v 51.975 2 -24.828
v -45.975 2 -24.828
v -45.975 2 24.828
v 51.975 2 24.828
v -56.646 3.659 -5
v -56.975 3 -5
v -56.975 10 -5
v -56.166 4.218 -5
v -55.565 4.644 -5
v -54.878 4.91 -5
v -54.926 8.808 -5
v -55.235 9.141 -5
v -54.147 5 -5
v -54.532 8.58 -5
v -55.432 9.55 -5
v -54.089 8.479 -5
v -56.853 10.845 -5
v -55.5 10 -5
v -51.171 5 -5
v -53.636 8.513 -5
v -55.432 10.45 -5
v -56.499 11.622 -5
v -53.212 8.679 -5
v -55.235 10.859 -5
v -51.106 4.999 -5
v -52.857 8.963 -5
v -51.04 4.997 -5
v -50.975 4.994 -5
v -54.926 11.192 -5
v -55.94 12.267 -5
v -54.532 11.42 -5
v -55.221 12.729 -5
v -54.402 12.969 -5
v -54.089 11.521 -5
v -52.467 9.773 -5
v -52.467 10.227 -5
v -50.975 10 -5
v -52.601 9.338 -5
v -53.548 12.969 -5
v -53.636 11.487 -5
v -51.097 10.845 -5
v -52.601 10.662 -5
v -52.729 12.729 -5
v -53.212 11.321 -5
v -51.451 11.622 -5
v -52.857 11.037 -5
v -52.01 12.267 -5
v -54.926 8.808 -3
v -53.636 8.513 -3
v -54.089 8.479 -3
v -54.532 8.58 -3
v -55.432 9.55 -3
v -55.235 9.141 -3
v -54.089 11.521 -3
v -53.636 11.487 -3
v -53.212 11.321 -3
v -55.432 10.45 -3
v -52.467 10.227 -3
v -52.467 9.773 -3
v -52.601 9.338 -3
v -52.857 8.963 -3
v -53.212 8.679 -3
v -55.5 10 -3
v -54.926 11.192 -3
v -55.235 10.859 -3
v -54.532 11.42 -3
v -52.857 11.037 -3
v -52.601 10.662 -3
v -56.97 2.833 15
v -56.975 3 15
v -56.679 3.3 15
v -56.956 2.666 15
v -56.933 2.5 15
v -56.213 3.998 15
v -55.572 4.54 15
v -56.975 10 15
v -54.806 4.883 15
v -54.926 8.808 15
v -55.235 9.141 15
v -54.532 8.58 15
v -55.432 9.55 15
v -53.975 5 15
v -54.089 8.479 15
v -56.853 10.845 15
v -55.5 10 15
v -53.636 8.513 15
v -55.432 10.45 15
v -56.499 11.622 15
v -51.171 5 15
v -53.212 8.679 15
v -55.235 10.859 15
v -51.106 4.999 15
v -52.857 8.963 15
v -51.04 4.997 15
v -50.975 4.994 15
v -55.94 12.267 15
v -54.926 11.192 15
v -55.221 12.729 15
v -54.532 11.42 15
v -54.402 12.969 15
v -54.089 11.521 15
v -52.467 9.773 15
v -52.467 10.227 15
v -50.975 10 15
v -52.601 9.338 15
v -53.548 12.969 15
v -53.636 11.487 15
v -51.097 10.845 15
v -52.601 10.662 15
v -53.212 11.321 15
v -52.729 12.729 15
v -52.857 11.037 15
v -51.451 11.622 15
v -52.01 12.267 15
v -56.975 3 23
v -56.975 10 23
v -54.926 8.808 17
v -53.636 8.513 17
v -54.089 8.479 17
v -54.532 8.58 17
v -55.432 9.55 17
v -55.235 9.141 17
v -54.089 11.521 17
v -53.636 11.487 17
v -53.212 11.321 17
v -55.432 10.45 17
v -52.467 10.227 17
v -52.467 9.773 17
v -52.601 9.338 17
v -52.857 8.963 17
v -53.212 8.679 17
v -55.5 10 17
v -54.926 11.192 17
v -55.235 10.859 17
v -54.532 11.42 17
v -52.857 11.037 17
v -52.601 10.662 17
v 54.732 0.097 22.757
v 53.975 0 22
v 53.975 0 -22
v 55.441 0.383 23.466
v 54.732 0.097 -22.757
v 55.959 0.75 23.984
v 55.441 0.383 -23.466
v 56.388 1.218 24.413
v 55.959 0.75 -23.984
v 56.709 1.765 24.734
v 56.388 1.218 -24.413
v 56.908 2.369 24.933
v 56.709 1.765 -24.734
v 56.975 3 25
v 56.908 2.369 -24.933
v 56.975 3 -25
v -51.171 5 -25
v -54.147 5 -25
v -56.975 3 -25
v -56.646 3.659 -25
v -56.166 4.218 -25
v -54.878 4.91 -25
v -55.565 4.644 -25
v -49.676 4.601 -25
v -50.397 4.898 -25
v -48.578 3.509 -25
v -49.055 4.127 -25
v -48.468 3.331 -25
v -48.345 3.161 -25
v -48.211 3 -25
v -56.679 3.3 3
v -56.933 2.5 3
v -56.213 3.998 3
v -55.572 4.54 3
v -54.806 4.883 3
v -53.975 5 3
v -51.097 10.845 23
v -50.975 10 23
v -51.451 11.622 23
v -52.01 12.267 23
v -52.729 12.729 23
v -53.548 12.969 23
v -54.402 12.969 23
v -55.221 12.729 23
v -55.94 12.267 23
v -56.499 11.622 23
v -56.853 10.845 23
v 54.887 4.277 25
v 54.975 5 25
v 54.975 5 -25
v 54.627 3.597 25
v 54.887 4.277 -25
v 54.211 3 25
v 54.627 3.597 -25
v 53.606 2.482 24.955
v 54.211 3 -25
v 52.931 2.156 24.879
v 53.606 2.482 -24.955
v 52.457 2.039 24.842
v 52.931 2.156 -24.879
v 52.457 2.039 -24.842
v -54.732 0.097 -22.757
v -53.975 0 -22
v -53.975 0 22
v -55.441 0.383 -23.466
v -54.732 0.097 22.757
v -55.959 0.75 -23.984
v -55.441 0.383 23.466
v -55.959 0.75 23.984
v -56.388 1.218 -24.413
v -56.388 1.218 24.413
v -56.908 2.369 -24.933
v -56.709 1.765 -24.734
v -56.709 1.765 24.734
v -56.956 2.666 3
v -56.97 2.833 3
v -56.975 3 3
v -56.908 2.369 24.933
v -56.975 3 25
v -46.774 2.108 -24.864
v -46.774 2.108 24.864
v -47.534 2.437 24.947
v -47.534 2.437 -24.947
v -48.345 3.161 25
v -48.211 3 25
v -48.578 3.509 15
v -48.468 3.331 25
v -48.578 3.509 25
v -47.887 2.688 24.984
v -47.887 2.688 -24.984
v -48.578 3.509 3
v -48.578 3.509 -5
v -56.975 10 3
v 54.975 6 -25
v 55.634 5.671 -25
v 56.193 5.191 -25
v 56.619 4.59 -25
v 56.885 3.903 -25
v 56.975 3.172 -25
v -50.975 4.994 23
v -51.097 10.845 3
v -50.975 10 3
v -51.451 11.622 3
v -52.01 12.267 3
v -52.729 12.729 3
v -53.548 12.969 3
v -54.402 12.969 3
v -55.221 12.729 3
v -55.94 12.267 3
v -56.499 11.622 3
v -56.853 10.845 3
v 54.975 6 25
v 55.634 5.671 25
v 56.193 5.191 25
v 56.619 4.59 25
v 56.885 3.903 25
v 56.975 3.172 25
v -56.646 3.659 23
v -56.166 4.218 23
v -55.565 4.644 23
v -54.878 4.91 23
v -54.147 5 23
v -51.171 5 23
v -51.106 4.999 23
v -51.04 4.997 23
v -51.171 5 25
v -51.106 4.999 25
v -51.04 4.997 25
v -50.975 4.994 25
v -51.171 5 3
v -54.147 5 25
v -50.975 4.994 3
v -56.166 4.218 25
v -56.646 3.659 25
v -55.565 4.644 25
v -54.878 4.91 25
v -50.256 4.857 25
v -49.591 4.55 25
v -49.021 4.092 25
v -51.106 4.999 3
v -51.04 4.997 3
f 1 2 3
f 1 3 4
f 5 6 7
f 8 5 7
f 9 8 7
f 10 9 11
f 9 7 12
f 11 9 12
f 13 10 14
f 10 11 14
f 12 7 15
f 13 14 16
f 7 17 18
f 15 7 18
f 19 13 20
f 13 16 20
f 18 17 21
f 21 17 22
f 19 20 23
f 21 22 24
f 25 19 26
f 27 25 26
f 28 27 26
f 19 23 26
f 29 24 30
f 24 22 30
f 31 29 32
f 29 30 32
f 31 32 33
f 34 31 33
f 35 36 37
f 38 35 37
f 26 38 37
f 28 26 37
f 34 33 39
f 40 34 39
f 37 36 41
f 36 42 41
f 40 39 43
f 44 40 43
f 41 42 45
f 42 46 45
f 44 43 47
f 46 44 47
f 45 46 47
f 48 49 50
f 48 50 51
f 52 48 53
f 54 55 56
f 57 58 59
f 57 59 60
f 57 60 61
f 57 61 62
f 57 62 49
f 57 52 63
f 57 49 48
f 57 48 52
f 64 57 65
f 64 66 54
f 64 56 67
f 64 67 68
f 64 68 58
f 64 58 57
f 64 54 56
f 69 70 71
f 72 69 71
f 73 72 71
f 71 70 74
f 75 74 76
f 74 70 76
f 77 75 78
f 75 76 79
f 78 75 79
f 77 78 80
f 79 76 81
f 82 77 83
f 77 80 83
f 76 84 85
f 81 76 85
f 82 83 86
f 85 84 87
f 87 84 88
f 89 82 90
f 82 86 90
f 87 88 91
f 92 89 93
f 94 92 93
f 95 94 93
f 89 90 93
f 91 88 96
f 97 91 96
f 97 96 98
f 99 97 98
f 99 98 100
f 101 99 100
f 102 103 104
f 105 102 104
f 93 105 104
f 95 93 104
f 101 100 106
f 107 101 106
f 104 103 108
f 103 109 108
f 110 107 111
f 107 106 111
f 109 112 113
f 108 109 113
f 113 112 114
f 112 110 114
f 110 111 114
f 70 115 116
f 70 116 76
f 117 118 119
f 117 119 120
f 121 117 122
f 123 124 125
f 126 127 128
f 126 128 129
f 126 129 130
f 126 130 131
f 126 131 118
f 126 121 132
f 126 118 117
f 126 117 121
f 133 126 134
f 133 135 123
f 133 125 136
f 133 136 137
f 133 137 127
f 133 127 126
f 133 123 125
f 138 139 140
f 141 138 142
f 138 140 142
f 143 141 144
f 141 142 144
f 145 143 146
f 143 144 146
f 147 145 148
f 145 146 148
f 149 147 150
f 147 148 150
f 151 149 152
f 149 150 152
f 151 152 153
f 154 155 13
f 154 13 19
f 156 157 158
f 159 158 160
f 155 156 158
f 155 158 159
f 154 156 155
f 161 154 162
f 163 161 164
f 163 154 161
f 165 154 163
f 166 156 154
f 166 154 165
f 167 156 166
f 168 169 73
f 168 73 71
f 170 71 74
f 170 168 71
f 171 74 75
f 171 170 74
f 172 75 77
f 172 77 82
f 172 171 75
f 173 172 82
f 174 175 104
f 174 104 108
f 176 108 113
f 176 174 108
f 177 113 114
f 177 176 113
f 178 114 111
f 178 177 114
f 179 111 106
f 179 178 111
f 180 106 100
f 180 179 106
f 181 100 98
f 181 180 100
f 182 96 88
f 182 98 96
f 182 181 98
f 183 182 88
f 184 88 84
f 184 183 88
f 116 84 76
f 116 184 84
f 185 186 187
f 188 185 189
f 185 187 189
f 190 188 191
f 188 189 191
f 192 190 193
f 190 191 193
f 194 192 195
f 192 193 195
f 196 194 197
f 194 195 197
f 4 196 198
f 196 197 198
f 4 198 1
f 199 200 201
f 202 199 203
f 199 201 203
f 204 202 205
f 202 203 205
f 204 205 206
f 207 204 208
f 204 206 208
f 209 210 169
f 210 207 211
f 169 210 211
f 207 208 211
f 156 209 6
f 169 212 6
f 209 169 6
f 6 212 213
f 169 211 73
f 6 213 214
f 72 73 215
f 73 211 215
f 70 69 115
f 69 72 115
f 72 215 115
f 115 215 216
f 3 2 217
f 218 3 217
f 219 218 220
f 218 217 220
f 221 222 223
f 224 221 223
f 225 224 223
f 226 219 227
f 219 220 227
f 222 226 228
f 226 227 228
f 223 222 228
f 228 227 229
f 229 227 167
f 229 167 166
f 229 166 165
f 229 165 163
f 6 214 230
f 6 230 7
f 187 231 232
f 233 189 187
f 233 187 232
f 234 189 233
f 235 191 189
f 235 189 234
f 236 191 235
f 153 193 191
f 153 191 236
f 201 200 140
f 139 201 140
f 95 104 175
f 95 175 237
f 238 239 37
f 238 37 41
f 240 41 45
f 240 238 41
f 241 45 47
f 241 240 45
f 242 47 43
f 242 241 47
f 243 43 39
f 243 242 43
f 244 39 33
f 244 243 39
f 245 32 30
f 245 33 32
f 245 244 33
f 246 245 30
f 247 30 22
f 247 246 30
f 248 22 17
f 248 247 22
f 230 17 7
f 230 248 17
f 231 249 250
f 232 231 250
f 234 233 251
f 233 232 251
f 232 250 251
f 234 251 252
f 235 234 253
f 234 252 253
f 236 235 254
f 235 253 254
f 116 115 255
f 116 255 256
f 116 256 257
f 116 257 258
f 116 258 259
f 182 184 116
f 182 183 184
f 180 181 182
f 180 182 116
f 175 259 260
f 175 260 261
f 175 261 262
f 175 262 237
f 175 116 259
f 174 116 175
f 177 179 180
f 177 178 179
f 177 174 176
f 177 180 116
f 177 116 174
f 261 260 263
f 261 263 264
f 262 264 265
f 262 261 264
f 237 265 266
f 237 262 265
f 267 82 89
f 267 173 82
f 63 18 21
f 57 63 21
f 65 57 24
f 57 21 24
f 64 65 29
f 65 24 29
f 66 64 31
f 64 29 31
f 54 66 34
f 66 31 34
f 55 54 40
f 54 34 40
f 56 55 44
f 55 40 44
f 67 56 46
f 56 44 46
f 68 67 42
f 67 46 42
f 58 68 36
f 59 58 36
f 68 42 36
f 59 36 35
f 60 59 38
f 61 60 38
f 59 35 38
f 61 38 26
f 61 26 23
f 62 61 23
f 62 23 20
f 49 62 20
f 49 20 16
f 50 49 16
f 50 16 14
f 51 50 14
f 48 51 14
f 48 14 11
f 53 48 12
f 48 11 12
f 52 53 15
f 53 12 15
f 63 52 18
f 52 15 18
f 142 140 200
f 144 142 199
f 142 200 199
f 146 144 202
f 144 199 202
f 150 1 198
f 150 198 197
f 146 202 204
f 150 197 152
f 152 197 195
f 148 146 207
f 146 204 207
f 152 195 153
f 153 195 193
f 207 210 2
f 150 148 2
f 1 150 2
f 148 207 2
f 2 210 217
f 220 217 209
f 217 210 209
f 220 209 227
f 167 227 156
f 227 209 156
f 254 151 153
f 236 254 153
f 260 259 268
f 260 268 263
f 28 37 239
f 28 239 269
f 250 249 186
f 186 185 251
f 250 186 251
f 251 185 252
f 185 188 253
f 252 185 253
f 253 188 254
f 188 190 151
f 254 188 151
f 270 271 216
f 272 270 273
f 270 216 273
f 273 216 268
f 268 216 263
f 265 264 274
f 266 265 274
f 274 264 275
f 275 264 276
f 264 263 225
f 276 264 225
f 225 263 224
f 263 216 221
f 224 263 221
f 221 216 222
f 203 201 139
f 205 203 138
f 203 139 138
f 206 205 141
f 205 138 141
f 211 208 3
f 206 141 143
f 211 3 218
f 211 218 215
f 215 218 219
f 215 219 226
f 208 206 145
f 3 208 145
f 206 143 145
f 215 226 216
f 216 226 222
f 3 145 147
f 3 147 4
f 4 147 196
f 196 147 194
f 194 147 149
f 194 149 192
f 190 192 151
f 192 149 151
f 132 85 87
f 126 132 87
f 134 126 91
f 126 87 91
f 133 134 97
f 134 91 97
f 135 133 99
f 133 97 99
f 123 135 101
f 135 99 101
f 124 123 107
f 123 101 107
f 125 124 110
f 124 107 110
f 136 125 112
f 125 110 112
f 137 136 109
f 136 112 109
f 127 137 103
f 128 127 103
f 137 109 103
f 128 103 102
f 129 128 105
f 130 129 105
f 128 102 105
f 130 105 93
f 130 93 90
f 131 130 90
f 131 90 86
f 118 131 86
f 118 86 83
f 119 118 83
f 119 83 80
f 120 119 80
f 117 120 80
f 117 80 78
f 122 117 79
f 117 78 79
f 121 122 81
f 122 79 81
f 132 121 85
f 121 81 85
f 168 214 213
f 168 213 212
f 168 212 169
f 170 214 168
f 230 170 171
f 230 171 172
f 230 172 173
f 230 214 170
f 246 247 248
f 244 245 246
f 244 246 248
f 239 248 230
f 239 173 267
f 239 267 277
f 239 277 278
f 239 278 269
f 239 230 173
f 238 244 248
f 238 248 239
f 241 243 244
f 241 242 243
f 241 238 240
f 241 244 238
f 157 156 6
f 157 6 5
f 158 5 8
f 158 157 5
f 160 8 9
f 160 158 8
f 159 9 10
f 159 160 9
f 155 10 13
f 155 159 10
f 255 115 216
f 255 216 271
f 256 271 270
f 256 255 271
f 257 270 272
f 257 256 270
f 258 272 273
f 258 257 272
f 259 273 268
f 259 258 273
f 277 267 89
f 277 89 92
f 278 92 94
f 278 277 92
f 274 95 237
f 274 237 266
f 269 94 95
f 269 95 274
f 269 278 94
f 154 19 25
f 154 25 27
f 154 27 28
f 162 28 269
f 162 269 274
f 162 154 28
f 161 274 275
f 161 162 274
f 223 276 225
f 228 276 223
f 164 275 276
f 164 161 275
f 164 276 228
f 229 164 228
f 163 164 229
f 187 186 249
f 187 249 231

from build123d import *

# Parameters (mm, degrees)
SKETCH1_W                     = 113.95
SKETCH1_H                     = 50
BOSS_EXTRUDE1_DEPTH           = 2
SKETCH2_W                     = 8
SKETCH2_H                     = 50
BOSS_EXTRUDE2_DEPTH           = 3
SKETCH3_W                     = 2
SKETCH3_H                     = 50
BOSS_EXTRUDE3_DEPTH           = 4
SKETCH7_W                     = 6
SKETCH7_H                     = 8
BOSS_EXTRUDE5_DEPTH           = 8
FILLET1_RADIUS                = 3
FILLET1_LENGTH                = 8
SKETCH10_R                    = 1.525
CUT_EXTRUDE2_DEPTH            = 2
LPATTERN2_COUNT               = 2
LPATTERN2_PITCH               = 20
FILLET1_OF_LPATTERN2_2_RADIUS = 3
FILLET1_OF_LPATTERN2_2_LENGTH = 8
FILLET2_R                     = 3
FILLET3_R                     = 3
FILLET4_START                 = -25
FILLET4_DEPTH                 = 20
FILLET4_START_2               = 3
FILLET4_2_DEPTH               = 12
FILLET4_START_3               = -19.719
FILLET4_3_DEPTH               = 44.719
FILLET4_START_4               = 23
FILLET4_4_DEPTH               = 2
FILLET5_R                     = 3


with BuildPart() as part:
    # Sketch1 → Boss-Extrude1 (new body)
    with BuildSketch(Plane(origin=(0, 0, 0), x_dir=(1, 0, 0), z_dir=(0, 1, 0))):
        Rectangle(SKETCH1_W, SKETCH1_H)
    extrude(amount=BOSS_EXTRUDE1_DEPTH)

    # Sketch2 → Boss-Extrude2 (add)
    with BuildSketch(Plane(origin=(0, 2, 0), x_dir=(1, 0, 0), z_dir=(0, 1, 0))):
        with Locations((-52.975, 0)):
            Rectangle(SKETCH2_W, SKETCH2_H)
    extrude(amount=BOSS_EXTRUDE2_DEPTH)

    # Sketch3 → Boss-Extrude3 (add)
    with BuildSketch(Plane(origin=(0, 2, 0), x_dir=(1, 0, 0), z_dir=(0, 1, 0))):
        with Locations((55.975, 0)):
            Rectangle(SKETCH3_W, SKETCH3_H)
    extrude(amount=BOSS_EXTRUDE3_DEPTH)

    # Sketch7 → Boss-Extrude5 (add)
    with BuildSketch(Plane(origin=(0, 5, 0), x_dir=(1, 0, 0), z_dir=(0, 1, 0))):
        with Locations((-53.975, 1)):
            Rectangle(SKETCH7_W, SKETCH7_H)
    boss_extrude5 = extrude(amount=BOSS_EXTRUDE5_DEPTH)

    # Fillet1: full round fillet: the end face becomes a half cylinder, R = half its width
    fillet1_face = Plane((-53.975, 13, -1), x_dir=(0, 0, 1), z_dir=(0, 1, 0))  # on the end face: x along it, z out of the body
    fillet1_slab = fillet1_face.offset(-FILLET1_RADIUS / 2) * Box(FILLET1_LENGTH, 2 * FILLET1_RADIUS, FILLET1_RADIUS, mode=Mode.PRIVATE)  # the body's end, R deep
    fillet1_round = Plane((-53.975, 10, -1), x_dir=(0, 1, 0), z_dir=(0, 0, 1)) * Cylinder(FILLET1_RADIUS, FILLET1_LENGTH, mode=Mode.PRIVATE)  # its axis R under the face
    add(fillet1_slab - fillet1_round, mode=Mode.SUBTRACT)

    # Sketch10 → Cut-Extrude2 (cut)
    with BuildSketch(Plane(origin=(0, 0, -5), x_dir=(-1, 0, 0), z_dir=(0, 0, -1))):
        with Locations((53.975, 10)):
            Circle(SKETCH10_R)
    cut_extrude2 = extrude(amount=-CUT_EXTRUDE2_DEPTH, mode=Mode.SUBTRACT)

    # LPattern2: Boss-Extrude5, Cut-Extrude2 ×2
    with Locations(*[(0, 0, i * LPATTERN2_PITCH) for i in range(1, LPATTERN2_COUNT)]):
        add(boss_extrude5)
        add(cut_extrude2, mode=Mode.SUBTRACT)

    # Fillet1 of LPattern2 2: full round fillet: the end face becomes a half cylinder, R = half its width
    fillet1_of_lpattern2_2_face = Plane((-53.975, 13, 19), x_dir=(0, 0, 1), z_dir=(0, 1, 0))  # on the end face: x along it, z out of the body
    fillet1_of_lpattern2_2_slab = fillet1_of_lpattern2_2_face.offset(-FILLET1_OF_LPATTERN2_2_RADIUS / 2) * Box(FILLET1_OF_LPATTERN2_2_LENGTH, 2 * FILLET1_OF_LPATTERN2_2_RADIUS, FILLET1_OF_LPATTERN2_2_RADIUS, mode=Mode.PRIVATE)  # the body's end, R deep
    fillet1_of_lpattern2_2_round = Plane((-53.975, 10, 19), x_dir=(0, 1, 0), z_dir=(0, 0, 1)) * Cylinder(FILLET1_OF_LPATTERN2_2_RADIUS, FILLET1_OF_LPATTERN2_2_LENGTH, mode=Mode.PRIVATE)  # its axis R under the face
    add(fillet1_of_lpattern2_2_slab - fillet1_of_lpattern2_2_round, mode=Mode.SUBTRACT)

    # Fillet2
    # the kernel refuses this fillet: 3 mm, written as the material it takes off along each edge
    with BuildSketch(Plane(origin=(-64.475, 0, -25), x_dir=(0, 1, 0), z_dir=(1, 0, 0))) as fillet2_piece_1:
        with BuildLine():
            CenterArc((FILLET2_R, FILLET2_R), FILLET2_R, 180, 90)
            Line((0, FILLET2_R), (0, 0))
            Line((0, 0), (FILLET2_R, 0))
        make_face()
    extrude(amount=128.95, mode=Mode.SUBTRACT)
    with BuildSketch(Plane(origin=(-56.975, 0, 32.5), x_dir=(1, 0, 0), z_dir=(0, 0, -1)), Plane(origin=(56.975, 0, -32.5), x_dir=(-1, 0, 0), z_dir=(0, 0, 1))) as fillet2_piece_2:
        with BuildLine():
            CenterArc((FILLET2_R, -FILLET2_R), FILLET2_R, 90, 90)
            Line((0, -FILLET2_R), (0, 0))
            Line((0, 0), (FILLET2_R, 0))
        make_face()
    extrude(amount=65, mode=Mode.SUBTRACT)
    with BuildSketch(Plane(origin=(64.475, 0, 25), x_dir=(0, 0, -1), z_dir=(-1, 0, 0))) as fillet2_piece_3:
        with BuildLine():
            CenterArc((FILLET2_R, -FILLET2_R), FILLET2_R, 90, 90)
            Line((0, -FILLET2_R), (0, 0))
            Line((0, 0), (FILLET2_R, 0))
        make_face()
    extrude(amount=128.95, mode=Mode.SUBTRACT)

    # Fillet3
    fillet3_edges = [part.edges().sort_by_distance(p)[0] for p in [
        (-48.975, 2, 0),
        (54.975, 2, 0),
    ]]
    fillet(fillet3_edges, radius=FILLET3_R - 0.0001)  # a hair under: the kernel refuses the full size

    # Fillet4: read off the stored shape, not the designer's step
    # Fillet4 outline → Fillet4 (cut)
    with BuildSketch(Plane.XY.offset(FILLET4_START)):
        with BuildLine():
            ThreePointArc((-51.171152423, 5), (-49.671152423, 4.598076211), (-48.573076211, 3.5))
            ThreePointArc((-48.573076211, 3.5), (-48.872777479, 4.223542864), (-48.975, 5))
            Line((-48.975, 5), (-51.171152423, 5))
        make_face()
        with BuildLine():
            ThreePointArc((-56.975, 3), (-55.878623683, 4.449489743), (-54.146572875, 5))
            Line((-54.146572875, 5), (-56.975, 5))
            Line((-56.975, 5), (-56.975, 3))
        make_face()
    extrude(amount=FILLET4_DEPTH, mode=Mode.SUBTRACT)

    # Fillet4 2 outline → Fillet4 2 (cut)
    with BuildSketch(Plane.XY.offset(FILLET4_START_2)):
        with BuildLine():
            Line((-53.975, 5), (-56.975, 5))
            Line((-56.975, 5), (-56.975, 3))
            ThreePointArc((-56.975, 3), (-56.964491568, 2.749121219), (-56.933039892, 2.5))
            ThreePointArc((-56.933039892, 2.5), (-55.911491673, 4.291287847), (-53.975, 5))
        make_face()
        with BuildLine():
            ThreePointArc((-51.171152423, 5), (-49.671152423, 4.598076211), (-48.573076211, 3.5))
            ThreePointArc((-48.573076211, 3.5), (-48.872777479, 4.223542864), (-48.975, 5))
            Line((-48.975, 5), (-51.171152423, 5))
        make_face()
    extrude(amount=FILLET4_2_DEPTH, mode=Mode.SUBTRACT)

    # Fillet4 3 outline → Fillet4 3 (cut)
    with BuildSketch(Plane.XY.offset(FILLET4_START_3)):
        with BuildLine():
            Line((-50.975, 5), (-50.975, 4.993580503))
            ThreePointArc((-50.975, 4.993580503), (-49.58697311, 4.547621617), (-48.573076211, 3.5))
            ThreePointArc((-48.573076211, 3.5), (-48.872777479, 4.223542864), (-48.975, 5))
            Line((-48.975, 5), (-50.975, 5))
        make_face()
    extrude(amount=FILLET4_3_DEPTH, mode=Mode.SUBTRACT)

    # Fillet4 4 outline → Fillet4 4 (cut)
    with BuildSketch(Plane.XY.offset(FILLET4_START_4)):
        with BuildLine():
            Line((-50.975, 5), (-51.171152423, 5))
            ThreePointArc((-51.171152423, 5), (-51.073023703, 4.998394696), (-50.975, 4.993580503))
            Line((-50.975, 4.993580503), (-50.975, 5))
        make_face()
        with BuildLine():
            ThreePointArc((-56.975, 3), (-55.878623683, 4.449489743), (-54.146572875, 5))
            Line((-54.146572875, 5), (-56.975, 5))
            Line((-56.975, 5), (-56.975, 3))
        make_face()
    extrude(amount=FILLET4_4_DEPTH, mode=Mode.SUBTRACT)

    # Fillet5
    # the kernel refuses this fillet: 3 mm, written as the material it takes off along each edge
    with BuildSketch(Plane(origin=(56.975, 6, 32.071067812), x_dir=(0, -1, 0), z_dir=(0, 0, -1))) as fillet5_piece_1:
        with BuildLine():
            CenterArc((2.828427125, 3), FILLET5_R, 199.471220634, 70.528779366)
            Line((0, 2), (-0.056568542, 1.98))
            ThreePointArc((-0.056568542, 1.98), (-0.06, 1), (-0.06, 0))
            Line((-0.06, 0), (0, -0.06))
            Line((0, -0.06), (2.828427125, -0.06))
            Line((2.828427125, -0.06), (2.828427125, 0))
        make_face()
    extrude(amount=64.142135624, mode=Mode.SUBTRACT)


solid = part.part
